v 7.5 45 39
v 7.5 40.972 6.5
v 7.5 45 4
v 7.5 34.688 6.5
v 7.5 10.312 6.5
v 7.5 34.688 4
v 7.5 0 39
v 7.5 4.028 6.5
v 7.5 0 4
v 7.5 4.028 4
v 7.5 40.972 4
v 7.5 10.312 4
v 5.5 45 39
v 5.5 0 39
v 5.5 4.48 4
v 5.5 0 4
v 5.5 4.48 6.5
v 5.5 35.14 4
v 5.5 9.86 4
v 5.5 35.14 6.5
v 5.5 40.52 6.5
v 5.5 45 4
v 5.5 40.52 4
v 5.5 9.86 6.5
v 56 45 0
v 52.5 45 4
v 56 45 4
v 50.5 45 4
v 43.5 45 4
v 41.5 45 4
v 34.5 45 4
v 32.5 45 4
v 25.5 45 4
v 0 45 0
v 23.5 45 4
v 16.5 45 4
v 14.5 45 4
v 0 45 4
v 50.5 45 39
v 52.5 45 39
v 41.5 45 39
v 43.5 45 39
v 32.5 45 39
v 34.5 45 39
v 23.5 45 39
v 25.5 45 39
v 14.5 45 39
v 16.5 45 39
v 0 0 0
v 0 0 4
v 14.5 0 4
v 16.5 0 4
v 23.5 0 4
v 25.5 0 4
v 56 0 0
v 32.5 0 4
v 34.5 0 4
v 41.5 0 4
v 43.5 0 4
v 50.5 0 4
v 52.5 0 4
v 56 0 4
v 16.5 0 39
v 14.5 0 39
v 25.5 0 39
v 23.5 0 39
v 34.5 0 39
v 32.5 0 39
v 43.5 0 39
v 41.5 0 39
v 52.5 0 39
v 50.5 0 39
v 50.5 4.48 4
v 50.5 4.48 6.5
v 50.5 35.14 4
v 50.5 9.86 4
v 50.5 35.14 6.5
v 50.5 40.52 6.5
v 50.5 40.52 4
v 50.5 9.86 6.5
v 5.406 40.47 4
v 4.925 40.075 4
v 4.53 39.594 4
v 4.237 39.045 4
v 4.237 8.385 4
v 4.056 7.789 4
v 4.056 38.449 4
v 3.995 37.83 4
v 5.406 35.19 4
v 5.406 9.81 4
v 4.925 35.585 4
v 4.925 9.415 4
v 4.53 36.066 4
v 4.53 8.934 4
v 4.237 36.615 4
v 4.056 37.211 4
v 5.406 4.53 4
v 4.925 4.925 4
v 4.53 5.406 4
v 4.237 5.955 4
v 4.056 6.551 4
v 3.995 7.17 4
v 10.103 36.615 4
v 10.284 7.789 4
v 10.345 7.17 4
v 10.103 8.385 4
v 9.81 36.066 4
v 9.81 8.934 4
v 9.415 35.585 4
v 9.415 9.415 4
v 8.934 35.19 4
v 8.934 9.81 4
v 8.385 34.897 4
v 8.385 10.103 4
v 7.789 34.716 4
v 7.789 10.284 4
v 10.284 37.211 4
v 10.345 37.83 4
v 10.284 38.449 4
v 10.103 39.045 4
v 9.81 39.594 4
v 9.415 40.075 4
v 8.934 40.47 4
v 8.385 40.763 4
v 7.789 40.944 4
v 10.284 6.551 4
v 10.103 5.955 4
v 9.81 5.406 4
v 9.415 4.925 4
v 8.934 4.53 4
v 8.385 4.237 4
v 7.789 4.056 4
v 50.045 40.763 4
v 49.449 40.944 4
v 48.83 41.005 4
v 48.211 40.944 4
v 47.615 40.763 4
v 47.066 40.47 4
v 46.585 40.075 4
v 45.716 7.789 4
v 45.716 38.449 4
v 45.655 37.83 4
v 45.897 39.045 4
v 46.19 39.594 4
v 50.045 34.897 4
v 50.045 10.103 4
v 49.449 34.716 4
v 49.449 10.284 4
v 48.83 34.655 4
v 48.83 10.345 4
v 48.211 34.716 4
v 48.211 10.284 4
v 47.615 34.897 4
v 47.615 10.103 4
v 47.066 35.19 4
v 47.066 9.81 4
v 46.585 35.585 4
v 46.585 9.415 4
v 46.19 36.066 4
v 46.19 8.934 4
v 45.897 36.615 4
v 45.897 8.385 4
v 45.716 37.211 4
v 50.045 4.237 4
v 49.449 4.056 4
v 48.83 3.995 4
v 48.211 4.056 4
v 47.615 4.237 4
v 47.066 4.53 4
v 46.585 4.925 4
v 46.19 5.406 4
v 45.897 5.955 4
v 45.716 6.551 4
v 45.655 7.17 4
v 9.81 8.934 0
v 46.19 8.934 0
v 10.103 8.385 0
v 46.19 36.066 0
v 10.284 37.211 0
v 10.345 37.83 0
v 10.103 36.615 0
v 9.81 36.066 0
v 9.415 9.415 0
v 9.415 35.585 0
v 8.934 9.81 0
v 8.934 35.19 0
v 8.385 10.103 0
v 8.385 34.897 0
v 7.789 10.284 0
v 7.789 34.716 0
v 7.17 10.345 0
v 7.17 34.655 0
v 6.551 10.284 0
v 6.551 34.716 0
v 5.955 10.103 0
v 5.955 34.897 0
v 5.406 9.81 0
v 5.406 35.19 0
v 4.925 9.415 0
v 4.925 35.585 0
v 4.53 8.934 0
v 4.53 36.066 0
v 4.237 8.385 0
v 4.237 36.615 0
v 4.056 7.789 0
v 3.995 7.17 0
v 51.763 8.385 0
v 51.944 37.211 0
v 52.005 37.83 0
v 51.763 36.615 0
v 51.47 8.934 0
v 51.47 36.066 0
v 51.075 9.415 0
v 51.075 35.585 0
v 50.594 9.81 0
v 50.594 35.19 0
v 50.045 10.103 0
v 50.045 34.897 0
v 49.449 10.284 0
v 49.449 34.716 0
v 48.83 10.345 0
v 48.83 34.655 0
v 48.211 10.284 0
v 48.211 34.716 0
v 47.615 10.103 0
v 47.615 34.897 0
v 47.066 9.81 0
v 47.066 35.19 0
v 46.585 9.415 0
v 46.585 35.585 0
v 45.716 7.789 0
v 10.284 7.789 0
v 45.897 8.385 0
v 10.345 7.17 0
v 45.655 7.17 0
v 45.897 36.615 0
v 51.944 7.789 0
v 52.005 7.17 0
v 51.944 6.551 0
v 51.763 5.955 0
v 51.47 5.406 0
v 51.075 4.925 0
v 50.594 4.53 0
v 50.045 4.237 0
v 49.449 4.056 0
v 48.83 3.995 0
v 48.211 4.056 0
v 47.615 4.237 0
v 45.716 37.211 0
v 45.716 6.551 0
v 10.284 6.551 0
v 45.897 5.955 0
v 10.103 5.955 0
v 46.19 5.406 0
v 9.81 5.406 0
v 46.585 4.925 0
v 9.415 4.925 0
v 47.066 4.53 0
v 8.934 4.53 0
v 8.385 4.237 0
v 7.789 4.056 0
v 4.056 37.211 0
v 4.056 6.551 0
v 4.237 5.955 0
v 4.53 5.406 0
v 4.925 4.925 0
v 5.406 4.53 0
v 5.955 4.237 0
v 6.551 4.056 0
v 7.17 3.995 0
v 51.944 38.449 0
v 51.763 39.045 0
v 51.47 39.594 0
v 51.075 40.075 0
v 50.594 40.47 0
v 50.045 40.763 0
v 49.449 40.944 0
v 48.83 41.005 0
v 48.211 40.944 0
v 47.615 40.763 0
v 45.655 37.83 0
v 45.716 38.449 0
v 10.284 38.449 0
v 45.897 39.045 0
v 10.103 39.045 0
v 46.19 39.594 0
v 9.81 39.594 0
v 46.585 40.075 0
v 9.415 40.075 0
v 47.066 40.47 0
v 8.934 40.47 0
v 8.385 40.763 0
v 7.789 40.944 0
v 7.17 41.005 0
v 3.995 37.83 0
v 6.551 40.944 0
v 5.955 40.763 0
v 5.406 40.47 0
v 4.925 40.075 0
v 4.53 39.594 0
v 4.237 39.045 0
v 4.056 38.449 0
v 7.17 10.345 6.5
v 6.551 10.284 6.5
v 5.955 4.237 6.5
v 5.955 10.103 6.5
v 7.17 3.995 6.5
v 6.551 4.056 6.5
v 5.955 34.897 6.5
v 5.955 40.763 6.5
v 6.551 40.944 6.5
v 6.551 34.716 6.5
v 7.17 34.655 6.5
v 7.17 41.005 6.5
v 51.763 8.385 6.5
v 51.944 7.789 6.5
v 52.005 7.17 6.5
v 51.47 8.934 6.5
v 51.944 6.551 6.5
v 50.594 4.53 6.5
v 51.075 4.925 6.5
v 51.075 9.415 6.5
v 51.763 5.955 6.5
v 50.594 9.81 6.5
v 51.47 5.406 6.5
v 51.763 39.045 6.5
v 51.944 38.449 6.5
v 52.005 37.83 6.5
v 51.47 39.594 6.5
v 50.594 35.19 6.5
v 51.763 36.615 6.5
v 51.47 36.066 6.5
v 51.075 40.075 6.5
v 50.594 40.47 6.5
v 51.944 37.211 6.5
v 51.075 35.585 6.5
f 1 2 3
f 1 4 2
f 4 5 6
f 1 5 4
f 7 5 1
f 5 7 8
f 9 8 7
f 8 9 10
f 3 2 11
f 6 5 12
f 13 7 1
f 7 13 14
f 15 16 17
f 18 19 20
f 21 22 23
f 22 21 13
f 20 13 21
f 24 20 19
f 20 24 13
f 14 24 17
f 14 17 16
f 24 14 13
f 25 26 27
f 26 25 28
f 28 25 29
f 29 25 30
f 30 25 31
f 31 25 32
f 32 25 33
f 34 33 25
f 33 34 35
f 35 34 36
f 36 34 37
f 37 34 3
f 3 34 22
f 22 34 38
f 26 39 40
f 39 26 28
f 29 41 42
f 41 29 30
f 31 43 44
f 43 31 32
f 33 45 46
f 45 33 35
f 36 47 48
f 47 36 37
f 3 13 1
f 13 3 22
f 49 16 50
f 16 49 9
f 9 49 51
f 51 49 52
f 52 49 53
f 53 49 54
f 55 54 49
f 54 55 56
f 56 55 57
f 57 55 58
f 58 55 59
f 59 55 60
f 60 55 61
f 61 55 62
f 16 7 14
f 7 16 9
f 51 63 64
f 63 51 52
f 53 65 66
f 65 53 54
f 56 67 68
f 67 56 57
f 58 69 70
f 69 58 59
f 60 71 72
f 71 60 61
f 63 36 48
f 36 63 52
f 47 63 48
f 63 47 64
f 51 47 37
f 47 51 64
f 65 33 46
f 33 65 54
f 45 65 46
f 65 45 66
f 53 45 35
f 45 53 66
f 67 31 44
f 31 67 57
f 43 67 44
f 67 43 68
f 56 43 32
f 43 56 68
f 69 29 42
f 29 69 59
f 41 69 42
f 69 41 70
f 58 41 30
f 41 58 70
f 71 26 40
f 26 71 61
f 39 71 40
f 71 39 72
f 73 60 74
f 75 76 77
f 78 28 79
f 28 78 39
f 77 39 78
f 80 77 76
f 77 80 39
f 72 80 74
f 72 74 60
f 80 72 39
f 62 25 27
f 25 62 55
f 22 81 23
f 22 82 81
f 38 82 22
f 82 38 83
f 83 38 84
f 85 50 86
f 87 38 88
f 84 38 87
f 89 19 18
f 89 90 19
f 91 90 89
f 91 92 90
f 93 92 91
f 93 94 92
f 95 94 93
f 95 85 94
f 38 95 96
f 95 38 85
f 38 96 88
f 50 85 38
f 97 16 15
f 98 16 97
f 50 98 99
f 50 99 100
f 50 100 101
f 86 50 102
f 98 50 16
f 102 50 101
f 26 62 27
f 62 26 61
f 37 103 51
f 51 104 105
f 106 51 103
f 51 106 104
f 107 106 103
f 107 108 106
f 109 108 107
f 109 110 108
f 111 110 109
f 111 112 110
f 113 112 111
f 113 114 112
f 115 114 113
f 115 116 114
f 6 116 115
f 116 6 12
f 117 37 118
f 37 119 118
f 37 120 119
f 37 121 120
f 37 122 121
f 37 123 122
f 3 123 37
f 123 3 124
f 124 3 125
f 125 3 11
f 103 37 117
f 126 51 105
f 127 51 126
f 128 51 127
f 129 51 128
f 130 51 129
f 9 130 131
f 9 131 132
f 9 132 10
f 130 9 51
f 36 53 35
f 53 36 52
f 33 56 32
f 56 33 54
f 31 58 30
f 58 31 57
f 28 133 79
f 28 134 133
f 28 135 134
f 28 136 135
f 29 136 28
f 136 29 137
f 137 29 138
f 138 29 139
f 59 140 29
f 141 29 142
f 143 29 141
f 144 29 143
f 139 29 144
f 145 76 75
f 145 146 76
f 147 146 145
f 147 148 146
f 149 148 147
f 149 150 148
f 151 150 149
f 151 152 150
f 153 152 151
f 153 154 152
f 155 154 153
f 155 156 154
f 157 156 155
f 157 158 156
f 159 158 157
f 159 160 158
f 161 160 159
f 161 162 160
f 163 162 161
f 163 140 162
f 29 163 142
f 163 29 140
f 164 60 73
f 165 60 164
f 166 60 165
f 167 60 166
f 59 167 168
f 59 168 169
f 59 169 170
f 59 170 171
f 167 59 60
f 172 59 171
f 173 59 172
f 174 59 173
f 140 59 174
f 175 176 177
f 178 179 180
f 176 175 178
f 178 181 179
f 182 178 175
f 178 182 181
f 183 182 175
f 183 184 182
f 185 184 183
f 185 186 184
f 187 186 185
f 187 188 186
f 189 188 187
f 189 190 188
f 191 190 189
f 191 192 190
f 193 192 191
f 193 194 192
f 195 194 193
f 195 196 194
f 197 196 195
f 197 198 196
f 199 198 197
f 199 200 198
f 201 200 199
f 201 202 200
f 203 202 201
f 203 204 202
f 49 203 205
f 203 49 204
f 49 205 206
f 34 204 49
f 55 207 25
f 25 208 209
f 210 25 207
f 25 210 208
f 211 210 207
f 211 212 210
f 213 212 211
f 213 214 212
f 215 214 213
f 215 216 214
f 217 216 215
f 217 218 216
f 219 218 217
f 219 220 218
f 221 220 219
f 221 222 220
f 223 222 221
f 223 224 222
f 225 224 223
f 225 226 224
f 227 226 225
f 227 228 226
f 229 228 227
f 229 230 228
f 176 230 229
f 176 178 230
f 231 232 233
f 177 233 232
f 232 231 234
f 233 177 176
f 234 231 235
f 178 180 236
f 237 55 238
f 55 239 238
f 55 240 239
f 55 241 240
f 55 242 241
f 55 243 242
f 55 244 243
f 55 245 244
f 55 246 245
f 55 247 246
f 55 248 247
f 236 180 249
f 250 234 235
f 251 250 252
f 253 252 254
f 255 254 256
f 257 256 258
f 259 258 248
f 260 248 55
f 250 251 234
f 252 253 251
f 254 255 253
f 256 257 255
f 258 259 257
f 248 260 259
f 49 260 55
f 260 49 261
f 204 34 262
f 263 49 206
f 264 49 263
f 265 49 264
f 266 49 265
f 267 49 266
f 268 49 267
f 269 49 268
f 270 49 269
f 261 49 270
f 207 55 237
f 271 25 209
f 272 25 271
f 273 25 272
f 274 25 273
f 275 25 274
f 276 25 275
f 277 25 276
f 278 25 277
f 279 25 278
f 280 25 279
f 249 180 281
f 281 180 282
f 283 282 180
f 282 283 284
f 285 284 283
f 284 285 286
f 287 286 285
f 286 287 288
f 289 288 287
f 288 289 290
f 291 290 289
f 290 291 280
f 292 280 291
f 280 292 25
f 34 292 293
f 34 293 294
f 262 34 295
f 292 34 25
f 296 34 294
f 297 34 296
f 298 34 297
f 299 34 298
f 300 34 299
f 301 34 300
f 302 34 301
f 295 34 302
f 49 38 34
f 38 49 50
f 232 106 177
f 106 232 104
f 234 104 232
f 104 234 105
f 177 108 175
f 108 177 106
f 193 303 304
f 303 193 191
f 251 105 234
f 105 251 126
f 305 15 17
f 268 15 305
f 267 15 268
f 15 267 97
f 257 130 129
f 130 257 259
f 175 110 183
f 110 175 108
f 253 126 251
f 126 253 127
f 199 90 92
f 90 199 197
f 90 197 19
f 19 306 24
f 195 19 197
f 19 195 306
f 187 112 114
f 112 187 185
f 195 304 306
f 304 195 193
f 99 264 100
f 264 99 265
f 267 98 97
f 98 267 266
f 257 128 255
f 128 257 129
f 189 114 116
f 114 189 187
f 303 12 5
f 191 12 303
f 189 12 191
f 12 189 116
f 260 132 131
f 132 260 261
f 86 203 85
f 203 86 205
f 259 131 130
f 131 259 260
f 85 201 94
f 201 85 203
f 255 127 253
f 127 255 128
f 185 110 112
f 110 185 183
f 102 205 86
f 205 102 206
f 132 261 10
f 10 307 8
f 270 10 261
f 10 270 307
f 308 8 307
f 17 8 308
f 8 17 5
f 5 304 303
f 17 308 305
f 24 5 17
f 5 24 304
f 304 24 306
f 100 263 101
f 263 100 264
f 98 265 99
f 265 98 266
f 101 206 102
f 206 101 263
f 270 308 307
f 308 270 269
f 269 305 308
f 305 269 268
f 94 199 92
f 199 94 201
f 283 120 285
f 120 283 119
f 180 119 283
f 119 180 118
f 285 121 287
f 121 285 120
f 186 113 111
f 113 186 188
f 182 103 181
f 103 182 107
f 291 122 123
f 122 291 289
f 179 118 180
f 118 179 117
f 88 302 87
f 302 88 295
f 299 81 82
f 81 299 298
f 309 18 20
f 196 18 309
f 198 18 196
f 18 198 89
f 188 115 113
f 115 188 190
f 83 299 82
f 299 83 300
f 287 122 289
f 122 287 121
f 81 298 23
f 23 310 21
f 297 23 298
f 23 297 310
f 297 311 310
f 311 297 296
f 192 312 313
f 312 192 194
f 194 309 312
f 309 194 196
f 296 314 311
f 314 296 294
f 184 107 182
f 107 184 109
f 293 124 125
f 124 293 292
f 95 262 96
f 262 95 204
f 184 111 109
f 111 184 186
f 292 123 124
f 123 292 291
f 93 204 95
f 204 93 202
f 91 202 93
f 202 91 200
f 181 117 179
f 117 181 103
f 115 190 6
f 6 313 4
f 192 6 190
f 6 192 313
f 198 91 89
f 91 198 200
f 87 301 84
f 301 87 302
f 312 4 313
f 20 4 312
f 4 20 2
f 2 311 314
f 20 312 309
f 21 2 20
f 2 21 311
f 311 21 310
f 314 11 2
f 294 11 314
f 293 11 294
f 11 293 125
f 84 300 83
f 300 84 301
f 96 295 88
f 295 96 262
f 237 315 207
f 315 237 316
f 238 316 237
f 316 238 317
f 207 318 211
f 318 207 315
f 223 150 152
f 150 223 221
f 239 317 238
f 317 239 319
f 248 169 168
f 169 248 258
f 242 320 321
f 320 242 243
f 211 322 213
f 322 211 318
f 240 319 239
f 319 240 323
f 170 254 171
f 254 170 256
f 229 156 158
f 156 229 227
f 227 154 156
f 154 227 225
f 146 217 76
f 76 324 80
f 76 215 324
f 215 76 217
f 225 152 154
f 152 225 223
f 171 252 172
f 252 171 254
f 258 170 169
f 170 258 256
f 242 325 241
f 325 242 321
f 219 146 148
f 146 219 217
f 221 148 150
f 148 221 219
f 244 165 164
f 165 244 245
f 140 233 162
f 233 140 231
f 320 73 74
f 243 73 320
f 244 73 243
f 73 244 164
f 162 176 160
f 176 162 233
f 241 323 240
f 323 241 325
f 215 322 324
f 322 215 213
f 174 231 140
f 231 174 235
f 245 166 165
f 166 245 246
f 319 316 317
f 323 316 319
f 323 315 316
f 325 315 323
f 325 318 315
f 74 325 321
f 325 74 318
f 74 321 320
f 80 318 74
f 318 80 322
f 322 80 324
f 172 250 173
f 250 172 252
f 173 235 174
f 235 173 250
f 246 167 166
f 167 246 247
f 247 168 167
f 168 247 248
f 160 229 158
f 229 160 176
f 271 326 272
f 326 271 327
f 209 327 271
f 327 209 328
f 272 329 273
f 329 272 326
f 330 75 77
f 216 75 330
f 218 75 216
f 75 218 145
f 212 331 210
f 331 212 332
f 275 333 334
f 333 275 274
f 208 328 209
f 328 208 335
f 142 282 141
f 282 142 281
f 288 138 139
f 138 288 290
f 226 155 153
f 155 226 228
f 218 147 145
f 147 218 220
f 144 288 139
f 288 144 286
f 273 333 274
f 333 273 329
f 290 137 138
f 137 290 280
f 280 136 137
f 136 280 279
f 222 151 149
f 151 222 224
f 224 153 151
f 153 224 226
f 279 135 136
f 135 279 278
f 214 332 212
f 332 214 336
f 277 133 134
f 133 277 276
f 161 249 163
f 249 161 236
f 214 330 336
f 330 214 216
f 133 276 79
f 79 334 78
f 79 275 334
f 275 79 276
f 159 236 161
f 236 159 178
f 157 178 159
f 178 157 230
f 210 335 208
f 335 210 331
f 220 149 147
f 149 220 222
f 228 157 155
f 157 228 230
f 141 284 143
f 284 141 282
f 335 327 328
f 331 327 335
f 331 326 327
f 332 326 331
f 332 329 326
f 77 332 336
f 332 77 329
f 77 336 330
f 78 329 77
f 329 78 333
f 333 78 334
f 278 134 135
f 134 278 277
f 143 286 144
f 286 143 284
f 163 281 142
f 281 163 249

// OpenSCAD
$fn = 32;

// ----------------------------------------------------------------------
// Finned heat sink: 56 x 45 mm base, 35 mm fins
// ----------------------------------------------------------------------

// --- parameters (mm) ---
base_w = 56;              // base width
base_d = 45;              // base depth
base_t = 4;               // base thickness
fin_h = 35;               // fin height above the base
holes_d = 6.35;           // fixing holes
hole_x = 20.83;           // hole offset in x
hole_y = 15.33;           // hole offset in y
fin_t = 2;                // fin thickness
fin_pitch = 9;            // fin pitch
fin_count = 6;            // number of fins
fin_x0 = 5.5;             // first fin offset

difference() {
  union() {
    cube([base_w, base_d, base_t]);
    for (i = [0 : fin_count - 1]) {
      translate([fin_x0 + i * fin_pitch, 0, base_t - 0.5]) cube([fin_t, base_d, fin_h + 0.5]);
    }
  }
  /* fixing holes through the base, 2.5 mm clear on both sides */
  for (hx = [-20.83, 20.83]) {
    for (hy = [-15.33, 15.33]) {
      translate([base_w / 2 + hx, base_d / 2 + hy, -2.5]) cylinder(h = base_t + 5, d = holes_d);
    }
  }
}
